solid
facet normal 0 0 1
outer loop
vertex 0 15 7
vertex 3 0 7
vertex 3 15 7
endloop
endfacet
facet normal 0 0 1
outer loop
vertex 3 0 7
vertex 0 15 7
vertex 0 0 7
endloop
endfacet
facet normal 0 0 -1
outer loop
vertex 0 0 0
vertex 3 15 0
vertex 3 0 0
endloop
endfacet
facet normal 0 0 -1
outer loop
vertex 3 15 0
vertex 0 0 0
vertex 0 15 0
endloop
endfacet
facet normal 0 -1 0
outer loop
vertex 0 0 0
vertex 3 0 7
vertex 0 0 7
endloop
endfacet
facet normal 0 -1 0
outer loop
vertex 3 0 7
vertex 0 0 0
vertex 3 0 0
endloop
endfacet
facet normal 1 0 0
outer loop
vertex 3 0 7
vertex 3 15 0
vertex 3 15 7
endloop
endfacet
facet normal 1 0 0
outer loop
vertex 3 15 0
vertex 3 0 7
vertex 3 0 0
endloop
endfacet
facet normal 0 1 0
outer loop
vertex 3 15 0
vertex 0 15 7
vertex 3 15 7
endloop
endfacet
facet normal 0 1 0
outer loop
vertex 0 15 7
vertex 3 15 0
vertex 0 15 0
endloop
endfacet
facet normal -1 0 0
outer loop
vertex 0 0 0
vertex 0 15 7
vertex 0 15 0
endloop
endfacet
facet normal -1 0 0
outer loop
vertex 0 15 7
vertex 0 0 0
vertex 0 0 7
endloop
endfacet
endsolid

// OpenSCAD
// Generated by SolidPython 1.0.1 on 2020-07-29 00:46:54


cube(size = [3, 15, 7]);
/***********************************************
*********      SolidPython code:      **********
************************************************
 
# import packages: SolidPython
from solid import *
from solid.utils import *
from itertools import chain, combinations, permutations


class Resize:

    def __init__(self, scad_file):
        self.scad_file = scad_file
        #self.scad_file = import_scad(scad_file)
        # cone/cylinder param:
        self.r1 = 0
        self.r2 = 0
        self.h = 0
        # rectangular prism param:
        self.w = 0
        self.l = 0
        # ellipse param:
        self.r = 0

    # import OpenScad code (file name corresponds to shape)


    # classify shape + parameters
    def assign(self, param1, param2, param3):
        if self.scad_file == 'cone.scad':
            self.r1 = param1
            self.r2 = param2
            self.h = param3
        elif self.scad_file == 'cylinder.scad':
            self.r1 = param1
            self.r2 = param2
            self.h = param3
        elif self.scad_file == 'rectangularPrism.scad':
            self.h = param1
            self.l = param2
            self.w = param3
        else:
            self.r = param1
            self.h = param2

    # resize parameters
    def iterate(self):
        x = range(3, 20, 2)
        i = 1
        if self.scad_file == 'cone.scad':
            tempList = list(permutations(x, 2))
            for temp in tempList:
                param1 = temp[0]
                param2 = temp[1]
                filepath = 'produced_scad_files/' + 'cone' + str(param1) + '_' + str(param2) + '_' + '.scad'
                scad_render_to_file(cylinder(h=param1, r1=param2, r2=0), filepath)

        elif self.scad_file == 'cylinder.scad':
            tempList = list(permutations(x, 3))
            for temp in tempList:
                param1 = temp[0]
                param2 = temp[1]
                filepath = 'produced_scad_files/' + 'cylinder' + str(param1) + '_' + str(param2) + '_' + '.scad'
                scad_render_to_file(cylinder(h=param1, r1=param2, r2=param2), filepath)

        elif self.scad_file == 'rectangularPrism.scad':
            tempList = list(permutations(x, 3))
            for temp in tempList:
                param1 = temp[0]
                param2 = temp[1]
                param3 = temp[2]
                filepath = 'produced_scad_files/' + 'rectangularPrism' + str(param1) + '_' + str(param2) + '_' + str(
                    param3) + '.scad'
                scad_render_to_file(cube(size=(param1, param2, param3)), filepath)

        elif self.scad_file == 'ellipse.scad':
            tempList = list(permutations(x, 4))
            for temp in tempList:
                param1 = temp[0]
                param2 = temp[1]
                param3 = temp[2]
                param4 = temp[3]
                filepath = 'produced_scad_files/' + 'ellipse' + str(param1) + '_' + str(param2) + '_' + str(param3) + '_' + str(param4) + '.scad'
                scad_render_to_file(scale([param1, param2, param3])(sphere(r=param4)), filepath)

    def render_to_scadfile(self):
        scad_render_to_file(scad, 'example.scad') 
 
************************************************/
